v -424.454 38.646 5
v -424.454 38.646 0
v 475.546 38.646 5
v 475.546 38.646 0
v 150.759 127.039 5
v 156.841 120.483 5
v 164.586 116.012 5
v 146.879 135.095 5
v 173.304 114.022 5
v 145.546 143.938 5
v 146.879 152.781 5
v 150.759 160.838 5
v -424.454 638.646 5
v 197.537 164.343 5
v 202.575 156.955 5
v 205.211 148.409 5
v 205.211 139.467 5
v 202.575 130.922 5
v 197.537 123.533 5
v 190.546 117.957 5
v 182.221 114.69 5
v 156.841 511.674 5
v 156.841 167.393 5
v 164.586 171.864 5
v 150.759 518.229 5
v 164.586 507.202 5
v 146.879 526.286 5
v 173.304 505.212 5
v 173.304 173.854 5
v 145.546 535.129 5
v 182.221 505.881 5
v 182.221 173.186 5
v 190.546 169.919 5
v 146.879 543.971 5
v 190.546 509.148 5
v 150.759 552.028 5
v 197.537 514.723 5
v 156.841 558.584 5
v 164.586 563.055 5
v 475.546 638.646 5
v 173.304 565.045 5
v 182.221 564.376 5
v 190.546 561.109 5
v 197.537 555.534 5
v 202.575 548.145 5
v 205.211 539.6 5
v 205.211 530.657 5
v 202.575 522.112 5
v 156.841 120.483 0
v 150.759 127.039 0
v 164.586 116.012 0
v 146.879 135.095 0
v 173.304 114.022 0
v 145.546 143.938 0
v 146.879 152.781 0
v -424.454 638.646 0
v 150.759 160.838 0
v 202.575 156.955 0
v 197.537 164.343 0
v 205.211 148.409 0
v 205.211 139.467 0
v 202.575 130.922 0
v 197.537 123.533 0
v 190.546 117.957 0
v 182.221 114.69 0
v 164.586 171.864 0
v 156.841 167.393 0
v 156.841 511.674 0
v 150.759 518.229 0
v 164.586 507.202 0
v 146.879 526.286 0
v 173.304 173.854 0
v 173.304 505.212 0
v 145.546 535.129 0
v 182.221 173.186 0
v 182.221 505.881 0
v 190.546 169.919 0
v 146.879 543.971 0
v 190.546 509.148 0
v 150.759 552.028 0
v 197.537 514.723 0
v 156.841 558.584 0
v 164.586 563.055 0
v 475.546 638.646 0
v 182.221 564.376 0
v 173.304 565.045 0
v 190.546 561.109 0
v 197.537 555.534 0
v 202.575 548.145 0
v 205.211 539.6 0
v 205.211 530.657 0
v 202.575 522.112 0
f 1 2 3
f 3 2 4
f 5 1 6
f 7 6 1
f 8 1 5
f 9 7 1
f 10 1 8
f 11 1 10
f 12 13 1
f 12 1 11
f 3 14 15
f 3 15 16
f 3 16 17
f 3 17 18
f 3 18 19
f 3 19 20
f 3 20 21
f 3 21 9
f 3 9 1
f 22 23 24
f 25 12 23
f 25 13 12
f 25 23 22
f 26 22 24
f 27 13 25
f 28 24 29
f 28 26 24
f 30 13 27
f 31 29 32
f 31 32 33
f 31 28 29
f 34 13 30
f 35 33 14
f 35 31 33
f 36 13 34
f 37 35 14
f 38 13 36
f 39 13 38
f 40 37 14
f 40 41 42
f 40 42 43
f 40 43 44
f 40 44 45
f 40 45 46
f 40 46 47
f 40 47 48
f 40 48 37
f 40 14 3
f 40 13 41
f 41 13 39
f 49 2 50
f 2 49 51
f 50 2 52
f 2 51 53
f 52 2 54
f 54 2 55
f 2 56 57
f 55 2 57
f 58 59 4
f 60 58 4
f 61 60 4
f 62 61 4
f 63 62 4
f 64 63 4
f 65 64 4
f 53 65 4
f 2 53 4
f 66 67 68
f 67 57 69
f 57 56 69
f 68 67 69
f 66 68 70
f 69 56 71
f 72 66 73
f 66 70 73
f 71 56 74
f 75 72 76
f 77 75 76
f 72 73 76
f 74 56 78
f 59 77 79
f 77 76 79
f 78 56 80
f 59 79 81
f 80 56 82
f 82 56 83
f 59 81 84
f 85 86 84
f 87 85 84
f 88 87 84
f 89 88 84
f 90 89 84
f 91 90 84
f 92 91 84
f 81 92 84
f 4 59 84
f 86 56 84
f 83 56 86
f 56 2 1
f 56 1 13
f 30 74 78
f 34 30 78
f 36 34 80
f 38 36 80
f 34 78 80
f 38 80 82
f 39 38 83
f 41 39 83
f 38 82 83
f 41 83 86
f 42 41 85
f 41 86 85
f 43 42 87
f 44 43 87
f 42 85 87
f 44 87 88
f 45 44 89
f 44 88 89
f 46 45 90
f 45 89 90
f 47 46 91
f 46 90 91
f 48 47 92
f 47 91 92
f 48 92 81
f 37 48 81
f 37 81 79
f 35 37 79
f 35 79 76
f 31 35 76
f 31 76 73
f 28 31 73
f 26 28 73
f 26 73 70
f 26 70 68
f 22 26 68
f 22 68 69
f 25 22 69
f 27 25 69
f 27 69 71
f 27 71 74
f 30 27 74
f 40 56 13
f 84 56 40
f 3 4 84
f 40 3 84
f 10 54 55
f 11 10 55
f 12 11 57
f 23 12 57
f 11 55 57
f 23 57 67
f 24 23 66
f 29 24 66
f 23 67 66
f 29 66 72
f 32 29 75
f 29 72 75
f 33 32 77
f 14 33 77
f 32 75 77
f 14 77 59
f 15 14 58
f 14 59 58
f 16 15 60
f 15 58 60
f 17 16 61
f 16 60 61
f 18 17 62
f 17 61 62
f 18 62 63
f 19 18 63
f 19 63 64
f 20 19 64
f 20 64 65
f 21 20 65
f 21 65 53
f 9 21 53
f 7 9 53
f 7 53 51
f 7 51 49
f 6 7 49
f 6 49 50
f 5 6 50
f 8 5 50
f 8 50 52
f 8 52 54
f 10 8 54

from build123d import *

# Parameters (mm, degrees)
SKETCH1_W           = 900
SKETCH1_H           = 600
BOSS_EXTRUDE1_DEPTH = 5
SKETCH2_R           = 30
CUT_EXTRUDE2_DEPTH  = 10
SKETCH3_R           = 30
CUT_EXTRUDE3_DEPTH  = 10


with BuildPart() as part:
    # Sketch1 → Boss-Extrude1 (new body)
    with BuildSketch(Plane.XY):
        with Locations((25.545851528, 338.64628821)):
            Rectangle(SKETCH1_W, SKETCH1_H)
    extrude(amount=BOSS_EXTRUDE1_DEPTH)

    # Sketch2 → Cut-Extrude2 (cut)
    with BuildSketch(Plane(origin=(0, 0, 0), x_dir=(-1, 0, 0), z_dir=(0, 0, -1))):
        with Locations((-175.545851528, 535.128567936)):
            Circle(SKETCH2_R)
    extrude(amount=-CUT_EXTRUDE2_DEPTH, mode=Mode.SUBTRACT)

    # Sketch3 → Cut-Extrude3 (cut)
    with BuildSketch(Plane(origin=(0, 0, 0), x_dir=(-1, 0, 0), z_dir=(0, 0, -1))):
        with Locations((-175.545851528, 143.938114846)):
            Circle(SKETCH3_R)
    extrude(amount=-CUT_EXTRUDE3_DEPTH, mode=Mode.SUBTRACT)


solid = part.part
